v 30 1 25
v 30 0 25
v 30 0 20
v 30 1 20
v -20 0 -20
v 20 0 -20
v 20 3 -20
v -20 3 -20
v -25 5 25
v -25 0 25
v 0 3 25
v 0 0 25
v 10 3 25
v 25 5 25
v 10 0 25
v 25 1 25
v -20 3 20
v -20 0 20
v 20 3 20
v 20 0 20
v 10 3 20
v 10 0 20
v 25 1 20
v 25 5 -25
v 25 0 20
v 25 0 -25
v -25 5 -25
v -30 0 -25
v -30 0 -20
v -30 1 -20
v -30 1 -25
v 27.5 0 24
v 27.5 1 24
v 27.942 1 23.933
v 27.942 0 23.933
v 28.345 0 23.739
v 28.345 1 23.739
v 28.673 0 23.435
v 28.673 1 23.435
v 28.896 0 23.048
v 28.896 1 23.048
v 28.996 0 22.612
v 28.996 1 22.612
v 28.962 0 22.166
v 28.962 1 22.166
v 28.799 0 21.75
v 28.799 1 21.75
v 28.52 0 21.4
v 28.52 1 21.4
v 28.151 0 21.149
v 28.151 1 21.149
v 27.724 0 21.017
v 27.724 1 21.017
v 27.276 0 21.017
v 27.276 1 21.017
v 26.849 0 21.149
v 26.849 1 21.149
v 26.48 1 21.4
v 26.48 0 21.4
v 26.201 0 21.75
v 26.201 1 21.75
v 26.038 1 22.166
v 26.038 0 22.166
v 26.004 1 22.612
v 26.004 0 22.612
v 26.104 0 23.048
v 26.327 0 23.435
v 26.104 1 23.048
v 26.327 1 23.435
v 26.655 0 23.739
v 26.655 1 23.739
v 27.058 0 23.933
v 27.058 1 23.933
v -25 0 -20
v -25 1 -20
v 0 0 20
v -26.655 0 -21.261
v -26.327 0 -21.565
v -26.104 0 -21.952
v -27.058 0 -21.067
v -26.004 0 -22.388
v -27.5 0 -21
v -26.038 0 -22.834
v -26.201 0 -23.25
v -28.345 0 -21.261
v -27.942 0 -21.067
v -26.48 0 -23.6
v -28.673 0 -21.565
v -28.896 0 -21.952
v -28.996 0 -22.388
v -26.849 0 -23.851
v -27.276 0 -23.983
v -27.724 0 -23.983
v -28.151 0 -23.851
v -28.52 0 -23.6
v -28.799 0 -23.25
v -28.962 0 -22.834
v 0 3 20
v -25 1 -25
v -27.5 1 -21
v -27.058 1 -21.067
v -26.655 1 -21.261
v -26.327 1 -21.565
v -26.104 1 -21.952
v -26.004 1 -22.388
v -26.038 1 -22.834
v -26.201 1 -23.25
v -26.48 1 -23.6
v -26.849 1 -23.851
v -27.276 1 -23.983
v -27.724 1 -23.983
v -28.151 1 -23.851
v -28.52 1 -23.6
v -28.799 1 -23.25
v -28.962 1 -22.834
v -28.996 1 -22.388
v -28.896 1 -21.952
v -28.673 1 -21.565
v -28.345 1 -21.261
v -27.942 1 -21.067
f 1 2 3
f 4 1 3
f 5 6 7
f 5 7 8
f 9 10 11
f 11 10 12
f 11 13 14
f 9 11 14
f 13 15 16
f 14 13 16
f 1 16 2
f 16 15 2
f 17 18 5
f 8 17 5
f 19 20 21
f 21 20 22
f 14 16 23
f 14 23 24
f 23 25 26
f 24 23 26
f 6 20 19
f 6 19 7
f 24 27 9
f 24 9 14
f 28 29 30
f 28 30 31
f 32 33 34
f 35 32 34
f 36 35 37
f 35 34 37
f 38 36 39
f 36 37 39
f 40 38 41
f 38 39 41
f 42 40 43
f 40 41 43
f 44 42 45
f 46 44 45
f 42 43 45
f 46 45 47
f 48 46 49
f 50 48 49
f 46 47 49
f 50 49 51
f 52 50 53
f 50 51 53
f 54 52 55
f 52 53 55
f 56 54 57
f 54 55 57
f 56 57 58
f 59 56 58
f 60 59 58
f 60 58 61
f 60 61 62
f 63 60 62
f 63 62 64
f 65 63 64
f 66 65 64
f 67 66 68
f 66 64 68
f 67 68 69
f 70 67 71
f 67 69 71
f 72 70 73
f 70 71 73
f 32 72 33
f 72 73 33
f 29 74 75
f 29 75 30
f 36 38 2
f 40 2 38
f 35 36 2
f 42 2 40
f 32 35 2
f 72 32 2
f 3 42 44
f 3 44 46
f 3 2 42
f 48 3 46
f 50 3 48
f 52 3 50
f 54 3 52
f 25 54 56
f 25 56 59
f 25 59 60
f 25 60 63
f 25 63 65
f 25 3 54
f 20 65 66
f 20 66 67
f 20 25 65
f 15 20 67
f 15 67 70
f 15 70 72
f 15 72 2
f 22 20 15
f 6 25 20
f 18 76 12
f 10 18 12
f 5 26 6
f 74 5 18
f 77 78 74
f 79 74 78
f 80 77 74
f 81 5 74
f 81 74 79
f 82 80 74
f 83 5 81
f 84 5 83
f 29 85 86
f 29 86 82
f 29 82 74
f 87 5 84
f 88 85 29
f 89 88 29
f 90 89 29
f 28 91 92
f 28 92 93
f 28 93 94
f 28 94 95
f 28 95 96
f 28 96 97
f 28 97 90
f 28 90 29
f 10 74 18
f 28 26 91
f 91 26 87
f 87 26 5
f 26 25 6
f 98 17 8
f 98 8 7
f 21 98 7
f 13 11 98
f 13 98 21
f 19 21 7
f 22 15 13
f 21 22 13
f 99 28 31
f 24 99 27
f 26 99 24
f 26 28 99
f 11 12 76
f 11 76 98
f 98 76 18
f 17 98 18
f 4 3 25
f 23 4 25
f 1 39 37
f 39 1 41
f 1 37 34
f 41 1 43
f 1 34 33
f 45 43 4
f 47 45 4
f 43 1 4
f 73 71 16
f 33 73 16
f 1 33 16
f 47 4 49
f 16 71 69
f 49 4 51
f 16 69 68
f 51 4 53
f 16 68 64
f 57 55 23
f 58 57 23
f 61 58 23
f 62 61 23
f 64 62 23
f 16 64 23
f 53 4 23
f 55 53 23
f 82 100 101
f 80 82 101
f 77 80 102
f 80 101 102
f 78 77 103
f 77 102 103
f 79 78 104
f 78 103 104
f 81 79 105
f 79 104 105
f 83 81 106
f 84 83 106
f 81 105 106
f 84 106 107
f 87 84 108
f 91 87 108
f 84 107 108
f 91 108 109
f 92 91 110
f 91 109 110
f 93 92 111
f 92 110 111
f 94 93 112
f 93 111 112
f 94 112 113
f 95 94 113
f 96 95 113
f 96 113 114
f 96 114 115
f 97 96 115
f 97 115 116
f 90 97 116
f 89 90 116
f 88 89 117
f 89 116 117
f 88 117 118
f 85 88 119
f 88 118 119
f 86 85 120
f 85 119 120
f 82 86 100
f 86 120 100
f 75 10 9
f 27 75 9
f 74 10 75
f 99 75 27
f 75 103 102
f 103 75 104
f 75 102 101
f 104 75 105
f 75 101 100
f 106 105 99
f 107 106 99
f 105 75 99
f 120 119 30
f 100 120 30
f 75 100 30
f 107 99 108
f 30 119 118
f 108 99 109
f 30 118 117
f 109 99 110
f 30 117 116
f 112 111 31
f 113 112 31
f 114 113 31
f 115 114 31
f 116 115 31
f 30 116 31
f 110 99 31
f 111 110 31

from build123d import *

# Parameters (mm, degrees)
SKETCH1_W           = 50
SKETCH1_H           = 50
BOSS_EXTRUDE2_DEPTH = 5
SKETCH2_W           = 40
SKETCH2_H           = 40
CUT_EXTRUDE1_DEPTH  = 3
SKETCH3_W           = 5
SKETCH3_H           = 5
BOSS_EXTRUDE3_DEPTH = 1
SKETCH4_R           = 1.5
CUT_EXTRUDE2_DEPTH  = 1
SKETCH6_W           = 10
SKETCH6_H           = 3
CUT_EXTRUDE3_DEPTH  = 10


with BuildPart() as part:
    # Sketch1 → Boss-Extrude2 (new body)
    with BuildSketch(Plane(origin=(0, 0, 0), x_dir=(1, 0, 0), z_dir=(0, 1, 0))):
        Rectangle(SKETCH1_W, SKETCH1_H)
    extrude(amount=BOSS_EXTRUDE2_DEPTH)

    # Sketch2 → Cut-Extrude1 (cut)
    with BuildSketch(Plane(origin=(0, 0, 0), x_dir=(-1, 0, 0), z_dir=(0, -1, 0))):
        Rectangle(SKETCH2_W, SKETCH2_H)
    extrude(amount=-CUT_EXTRUDE1_DEPTH, mode=Mode.SUBTRACT)

    # Sketch3 → Boss-Extrude3 (add)
    with BuildSketch(Plane(origin=(0, 0, 0), x_dir=(-1, 0, 0), z_dir=(0, -1, 0))):
        with Locations((27.5, 22.5)):
            Rectangle(SKETCH3_W, SKETCH3_H)
        with Locations((-27.5, -22.5)):
            Rectangle(SKETCH3_W, SKETCH3_H)
    extrude(amount=-BOSS_EXTRUDE3_DEPTH)

    # Sketch4 → Cut-Extrude2 (cut)
    with BuildSketch(Plane(origin=(0, 1, 0), x_dir=(1, 0, 0), z_dir=(0, 1, 0))):
        with Locations(Location((-27.5, 22.5, 0), (0, 0, 270))):  # turned: the seam where the file's is
            Circle(SKETCH4_R)
        with Locations(Location((27.5, -22.5, 0), (0, 0, 270))):  # turned: the seam where the file's is
            Circle(SKETCH4_R)
    extrude(amount=-CUT_EXTRUDE2_DEPTH, mode=Mode.SUBTRACT)

    # Sketch6 → Cut-Extrude3 (cut)
    with BuildSketch(Plane.XY.offset(25)):
        with Locations((5, 1.5)):
            Rectangle(SKETCH6_W, SKETCH6_H)
    extrude(amount=-CUT_EXTRUDE3_DEPTH, mode=Mode.SUBTRACT)


solid = part.part
